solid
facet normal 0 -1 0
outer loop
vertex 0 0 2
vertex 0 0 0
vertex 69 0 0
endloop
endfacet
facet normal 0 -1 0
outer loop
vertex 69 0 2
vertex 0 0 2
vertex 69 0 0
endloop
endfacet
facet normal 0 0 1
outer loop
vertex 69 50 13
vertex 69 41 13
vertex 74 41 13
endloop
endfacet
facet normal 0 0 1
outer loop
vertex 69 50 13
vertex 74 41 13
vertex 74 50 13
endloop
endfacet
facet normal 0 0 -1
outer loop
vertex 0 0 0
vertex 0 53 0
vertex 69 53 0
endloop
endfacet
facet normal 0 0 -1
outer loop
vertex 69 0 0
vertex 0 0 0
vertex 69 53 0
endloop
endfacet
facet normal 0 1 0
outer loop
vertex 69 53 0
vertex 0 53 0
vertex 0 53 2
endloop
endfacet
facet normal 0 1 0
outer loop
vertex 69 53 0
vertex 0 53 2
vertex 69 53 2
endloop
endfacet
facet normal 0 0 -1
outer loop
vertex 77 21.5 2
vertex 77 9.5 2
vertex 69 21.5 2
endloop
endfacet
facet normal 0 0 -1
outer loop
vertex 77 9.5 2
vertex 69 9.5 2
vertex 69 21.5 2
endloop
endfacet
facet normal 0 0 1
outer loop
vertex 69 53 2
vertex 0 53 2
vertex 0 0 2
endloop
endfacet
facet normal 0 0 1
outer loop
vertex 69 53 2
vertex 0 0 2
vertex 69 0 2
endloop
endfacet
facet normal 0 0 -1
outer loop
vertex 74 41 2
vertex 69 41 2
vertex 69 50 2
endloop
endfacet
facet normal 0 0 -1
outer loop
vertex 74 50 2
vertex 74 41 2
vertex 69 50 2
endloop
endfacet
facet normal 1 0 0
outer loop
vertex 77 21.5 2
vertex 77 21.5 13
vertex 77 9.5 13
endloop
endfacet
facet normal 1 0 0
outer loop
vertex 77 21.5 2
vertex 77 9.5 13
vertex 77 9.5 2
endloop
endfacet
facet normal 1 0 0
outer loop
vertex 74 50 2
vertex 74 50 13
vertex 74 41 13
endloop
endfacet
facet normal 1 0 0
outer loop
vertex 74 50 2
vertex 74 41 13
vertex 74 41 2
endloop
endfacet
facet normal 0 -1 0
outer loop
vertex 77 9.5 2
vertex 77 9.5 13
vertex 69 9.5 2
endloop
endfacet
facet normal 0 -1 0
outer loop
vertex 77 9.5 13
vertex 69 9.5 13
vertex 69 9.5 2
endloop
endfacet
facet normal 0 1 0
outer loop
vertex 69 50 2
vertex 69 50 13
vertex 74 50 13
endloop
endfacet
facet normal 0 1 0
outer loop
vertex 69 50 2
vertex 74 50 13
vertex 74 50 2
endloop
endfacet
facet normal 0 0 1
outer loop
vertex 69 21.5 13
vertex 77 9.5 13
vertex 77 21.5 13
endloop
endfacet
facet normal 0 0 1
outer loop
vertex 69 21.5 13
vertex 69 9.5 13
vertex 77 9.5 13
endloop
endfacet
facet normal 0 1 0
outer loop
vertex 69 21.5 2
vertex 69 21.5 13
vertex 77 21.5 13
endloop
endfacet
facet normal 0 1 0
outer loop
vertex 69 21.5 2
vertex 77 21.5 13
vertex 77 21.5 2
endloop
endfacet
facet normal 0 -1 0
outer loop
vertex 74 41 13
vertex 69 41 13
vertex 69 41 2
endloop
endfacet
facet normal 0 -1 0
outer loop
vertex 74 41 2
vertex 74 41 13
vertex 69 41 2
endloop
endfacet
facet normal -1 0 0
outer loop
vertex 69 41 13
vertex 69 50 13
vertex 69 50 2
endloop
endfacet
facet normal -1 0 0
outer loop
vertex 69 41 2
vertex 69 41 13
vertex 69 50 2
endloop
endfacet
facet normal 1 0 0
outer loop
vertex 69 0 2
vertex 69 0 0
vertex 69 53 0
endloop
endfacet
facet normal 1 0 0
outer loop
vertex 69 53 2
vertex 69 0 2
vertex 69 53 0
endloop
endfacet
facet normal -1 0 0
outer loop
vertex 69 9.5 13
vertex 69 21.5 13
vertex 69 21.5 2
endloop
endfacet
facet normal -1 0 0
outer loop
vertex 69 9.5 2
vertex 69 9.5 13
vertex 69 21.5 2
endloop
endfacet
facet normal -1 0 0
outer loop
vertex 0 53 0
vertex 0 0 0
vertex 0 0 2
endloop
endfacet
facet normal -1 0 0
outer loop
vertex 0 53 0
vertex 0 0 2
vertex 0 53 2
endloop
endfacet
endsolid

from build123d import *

# Parameters (mm, degrees)
ESBO_O1_W                  = 69
ESBO_O1_H                  = 53
RESSALTO_EXTRUS_O1_DEPTH   = 2
ESBO_O2_W                  = 11
ESBO_O2_H                  = 9
RESSALTO_EXTRUS_O2_DEPTH   = 5
ESBO_O2_H_2                = 12
RESSALTO_EXTRUS_O2_2_DEPTH = 5
ESBO_O3_W                  = 11
ESBO_O3_H                  = 12
RESSALTO_EXTRUS_O3_DEPTH   = 3


with BuildPart() as part:
    # Esboço1 → Ressalto-extrusão1 (new body)
    with BuildSketch(Plane.XY):
        with Locations((34.5, 26.5)):
            Rectangle(ESBO_O1_W, ESBO_O1_H)
    extrude(amount=RESSALTO_EXTRUS_O1_DEPTH)


with BuildPart() as body_2:
    # Esboço2 → Ressalto-extrusão2 (new body)
    with BuildSketch(Plane(origin=(69, 0, 0), x_dir=(0, 0, -1), z_dir=(1, 0, 0))):
        with Locations((-7.5, 45.5)):
            Rectangle(ESBO_O2_W, ESBO_O2_H)
    extrude(amount=RESSALTO_EXTRUS_O2_DEPTH)


with BuildPart() as body_3:
    # Esboço2 → Ressalto-extrus_o2 2 (new body)
    with BuildSketch(Plane(origin=(69, 0, 0), x_dir=(0, 0, -1), z_dir=(1, 0, 0))):
        with Locations((-7.5, 15.5)):
            Rectangle(ESBO_O2_W, ESBO_O2_H_2)
    extrude(amount=RESSALTO_EXTRUS_O2_2_DEPTH)

    # Esboço3 → Ressalto-extrusão3 (add)
    with BuildSketch(Plane(origin=(74, 0, 0), x_dir=(0, 0, -1), z_dir=(1, 0, 0))):
        with Locations((-7.5, 15.5)):
            Rectangle(ESBO_O3_W, ESBO_O3_H)
    extrude(amount=RESSALTO_EXTRUS_O3_DEPTH)


solid = Compound([part.part, body_2.part, body_3.part])
